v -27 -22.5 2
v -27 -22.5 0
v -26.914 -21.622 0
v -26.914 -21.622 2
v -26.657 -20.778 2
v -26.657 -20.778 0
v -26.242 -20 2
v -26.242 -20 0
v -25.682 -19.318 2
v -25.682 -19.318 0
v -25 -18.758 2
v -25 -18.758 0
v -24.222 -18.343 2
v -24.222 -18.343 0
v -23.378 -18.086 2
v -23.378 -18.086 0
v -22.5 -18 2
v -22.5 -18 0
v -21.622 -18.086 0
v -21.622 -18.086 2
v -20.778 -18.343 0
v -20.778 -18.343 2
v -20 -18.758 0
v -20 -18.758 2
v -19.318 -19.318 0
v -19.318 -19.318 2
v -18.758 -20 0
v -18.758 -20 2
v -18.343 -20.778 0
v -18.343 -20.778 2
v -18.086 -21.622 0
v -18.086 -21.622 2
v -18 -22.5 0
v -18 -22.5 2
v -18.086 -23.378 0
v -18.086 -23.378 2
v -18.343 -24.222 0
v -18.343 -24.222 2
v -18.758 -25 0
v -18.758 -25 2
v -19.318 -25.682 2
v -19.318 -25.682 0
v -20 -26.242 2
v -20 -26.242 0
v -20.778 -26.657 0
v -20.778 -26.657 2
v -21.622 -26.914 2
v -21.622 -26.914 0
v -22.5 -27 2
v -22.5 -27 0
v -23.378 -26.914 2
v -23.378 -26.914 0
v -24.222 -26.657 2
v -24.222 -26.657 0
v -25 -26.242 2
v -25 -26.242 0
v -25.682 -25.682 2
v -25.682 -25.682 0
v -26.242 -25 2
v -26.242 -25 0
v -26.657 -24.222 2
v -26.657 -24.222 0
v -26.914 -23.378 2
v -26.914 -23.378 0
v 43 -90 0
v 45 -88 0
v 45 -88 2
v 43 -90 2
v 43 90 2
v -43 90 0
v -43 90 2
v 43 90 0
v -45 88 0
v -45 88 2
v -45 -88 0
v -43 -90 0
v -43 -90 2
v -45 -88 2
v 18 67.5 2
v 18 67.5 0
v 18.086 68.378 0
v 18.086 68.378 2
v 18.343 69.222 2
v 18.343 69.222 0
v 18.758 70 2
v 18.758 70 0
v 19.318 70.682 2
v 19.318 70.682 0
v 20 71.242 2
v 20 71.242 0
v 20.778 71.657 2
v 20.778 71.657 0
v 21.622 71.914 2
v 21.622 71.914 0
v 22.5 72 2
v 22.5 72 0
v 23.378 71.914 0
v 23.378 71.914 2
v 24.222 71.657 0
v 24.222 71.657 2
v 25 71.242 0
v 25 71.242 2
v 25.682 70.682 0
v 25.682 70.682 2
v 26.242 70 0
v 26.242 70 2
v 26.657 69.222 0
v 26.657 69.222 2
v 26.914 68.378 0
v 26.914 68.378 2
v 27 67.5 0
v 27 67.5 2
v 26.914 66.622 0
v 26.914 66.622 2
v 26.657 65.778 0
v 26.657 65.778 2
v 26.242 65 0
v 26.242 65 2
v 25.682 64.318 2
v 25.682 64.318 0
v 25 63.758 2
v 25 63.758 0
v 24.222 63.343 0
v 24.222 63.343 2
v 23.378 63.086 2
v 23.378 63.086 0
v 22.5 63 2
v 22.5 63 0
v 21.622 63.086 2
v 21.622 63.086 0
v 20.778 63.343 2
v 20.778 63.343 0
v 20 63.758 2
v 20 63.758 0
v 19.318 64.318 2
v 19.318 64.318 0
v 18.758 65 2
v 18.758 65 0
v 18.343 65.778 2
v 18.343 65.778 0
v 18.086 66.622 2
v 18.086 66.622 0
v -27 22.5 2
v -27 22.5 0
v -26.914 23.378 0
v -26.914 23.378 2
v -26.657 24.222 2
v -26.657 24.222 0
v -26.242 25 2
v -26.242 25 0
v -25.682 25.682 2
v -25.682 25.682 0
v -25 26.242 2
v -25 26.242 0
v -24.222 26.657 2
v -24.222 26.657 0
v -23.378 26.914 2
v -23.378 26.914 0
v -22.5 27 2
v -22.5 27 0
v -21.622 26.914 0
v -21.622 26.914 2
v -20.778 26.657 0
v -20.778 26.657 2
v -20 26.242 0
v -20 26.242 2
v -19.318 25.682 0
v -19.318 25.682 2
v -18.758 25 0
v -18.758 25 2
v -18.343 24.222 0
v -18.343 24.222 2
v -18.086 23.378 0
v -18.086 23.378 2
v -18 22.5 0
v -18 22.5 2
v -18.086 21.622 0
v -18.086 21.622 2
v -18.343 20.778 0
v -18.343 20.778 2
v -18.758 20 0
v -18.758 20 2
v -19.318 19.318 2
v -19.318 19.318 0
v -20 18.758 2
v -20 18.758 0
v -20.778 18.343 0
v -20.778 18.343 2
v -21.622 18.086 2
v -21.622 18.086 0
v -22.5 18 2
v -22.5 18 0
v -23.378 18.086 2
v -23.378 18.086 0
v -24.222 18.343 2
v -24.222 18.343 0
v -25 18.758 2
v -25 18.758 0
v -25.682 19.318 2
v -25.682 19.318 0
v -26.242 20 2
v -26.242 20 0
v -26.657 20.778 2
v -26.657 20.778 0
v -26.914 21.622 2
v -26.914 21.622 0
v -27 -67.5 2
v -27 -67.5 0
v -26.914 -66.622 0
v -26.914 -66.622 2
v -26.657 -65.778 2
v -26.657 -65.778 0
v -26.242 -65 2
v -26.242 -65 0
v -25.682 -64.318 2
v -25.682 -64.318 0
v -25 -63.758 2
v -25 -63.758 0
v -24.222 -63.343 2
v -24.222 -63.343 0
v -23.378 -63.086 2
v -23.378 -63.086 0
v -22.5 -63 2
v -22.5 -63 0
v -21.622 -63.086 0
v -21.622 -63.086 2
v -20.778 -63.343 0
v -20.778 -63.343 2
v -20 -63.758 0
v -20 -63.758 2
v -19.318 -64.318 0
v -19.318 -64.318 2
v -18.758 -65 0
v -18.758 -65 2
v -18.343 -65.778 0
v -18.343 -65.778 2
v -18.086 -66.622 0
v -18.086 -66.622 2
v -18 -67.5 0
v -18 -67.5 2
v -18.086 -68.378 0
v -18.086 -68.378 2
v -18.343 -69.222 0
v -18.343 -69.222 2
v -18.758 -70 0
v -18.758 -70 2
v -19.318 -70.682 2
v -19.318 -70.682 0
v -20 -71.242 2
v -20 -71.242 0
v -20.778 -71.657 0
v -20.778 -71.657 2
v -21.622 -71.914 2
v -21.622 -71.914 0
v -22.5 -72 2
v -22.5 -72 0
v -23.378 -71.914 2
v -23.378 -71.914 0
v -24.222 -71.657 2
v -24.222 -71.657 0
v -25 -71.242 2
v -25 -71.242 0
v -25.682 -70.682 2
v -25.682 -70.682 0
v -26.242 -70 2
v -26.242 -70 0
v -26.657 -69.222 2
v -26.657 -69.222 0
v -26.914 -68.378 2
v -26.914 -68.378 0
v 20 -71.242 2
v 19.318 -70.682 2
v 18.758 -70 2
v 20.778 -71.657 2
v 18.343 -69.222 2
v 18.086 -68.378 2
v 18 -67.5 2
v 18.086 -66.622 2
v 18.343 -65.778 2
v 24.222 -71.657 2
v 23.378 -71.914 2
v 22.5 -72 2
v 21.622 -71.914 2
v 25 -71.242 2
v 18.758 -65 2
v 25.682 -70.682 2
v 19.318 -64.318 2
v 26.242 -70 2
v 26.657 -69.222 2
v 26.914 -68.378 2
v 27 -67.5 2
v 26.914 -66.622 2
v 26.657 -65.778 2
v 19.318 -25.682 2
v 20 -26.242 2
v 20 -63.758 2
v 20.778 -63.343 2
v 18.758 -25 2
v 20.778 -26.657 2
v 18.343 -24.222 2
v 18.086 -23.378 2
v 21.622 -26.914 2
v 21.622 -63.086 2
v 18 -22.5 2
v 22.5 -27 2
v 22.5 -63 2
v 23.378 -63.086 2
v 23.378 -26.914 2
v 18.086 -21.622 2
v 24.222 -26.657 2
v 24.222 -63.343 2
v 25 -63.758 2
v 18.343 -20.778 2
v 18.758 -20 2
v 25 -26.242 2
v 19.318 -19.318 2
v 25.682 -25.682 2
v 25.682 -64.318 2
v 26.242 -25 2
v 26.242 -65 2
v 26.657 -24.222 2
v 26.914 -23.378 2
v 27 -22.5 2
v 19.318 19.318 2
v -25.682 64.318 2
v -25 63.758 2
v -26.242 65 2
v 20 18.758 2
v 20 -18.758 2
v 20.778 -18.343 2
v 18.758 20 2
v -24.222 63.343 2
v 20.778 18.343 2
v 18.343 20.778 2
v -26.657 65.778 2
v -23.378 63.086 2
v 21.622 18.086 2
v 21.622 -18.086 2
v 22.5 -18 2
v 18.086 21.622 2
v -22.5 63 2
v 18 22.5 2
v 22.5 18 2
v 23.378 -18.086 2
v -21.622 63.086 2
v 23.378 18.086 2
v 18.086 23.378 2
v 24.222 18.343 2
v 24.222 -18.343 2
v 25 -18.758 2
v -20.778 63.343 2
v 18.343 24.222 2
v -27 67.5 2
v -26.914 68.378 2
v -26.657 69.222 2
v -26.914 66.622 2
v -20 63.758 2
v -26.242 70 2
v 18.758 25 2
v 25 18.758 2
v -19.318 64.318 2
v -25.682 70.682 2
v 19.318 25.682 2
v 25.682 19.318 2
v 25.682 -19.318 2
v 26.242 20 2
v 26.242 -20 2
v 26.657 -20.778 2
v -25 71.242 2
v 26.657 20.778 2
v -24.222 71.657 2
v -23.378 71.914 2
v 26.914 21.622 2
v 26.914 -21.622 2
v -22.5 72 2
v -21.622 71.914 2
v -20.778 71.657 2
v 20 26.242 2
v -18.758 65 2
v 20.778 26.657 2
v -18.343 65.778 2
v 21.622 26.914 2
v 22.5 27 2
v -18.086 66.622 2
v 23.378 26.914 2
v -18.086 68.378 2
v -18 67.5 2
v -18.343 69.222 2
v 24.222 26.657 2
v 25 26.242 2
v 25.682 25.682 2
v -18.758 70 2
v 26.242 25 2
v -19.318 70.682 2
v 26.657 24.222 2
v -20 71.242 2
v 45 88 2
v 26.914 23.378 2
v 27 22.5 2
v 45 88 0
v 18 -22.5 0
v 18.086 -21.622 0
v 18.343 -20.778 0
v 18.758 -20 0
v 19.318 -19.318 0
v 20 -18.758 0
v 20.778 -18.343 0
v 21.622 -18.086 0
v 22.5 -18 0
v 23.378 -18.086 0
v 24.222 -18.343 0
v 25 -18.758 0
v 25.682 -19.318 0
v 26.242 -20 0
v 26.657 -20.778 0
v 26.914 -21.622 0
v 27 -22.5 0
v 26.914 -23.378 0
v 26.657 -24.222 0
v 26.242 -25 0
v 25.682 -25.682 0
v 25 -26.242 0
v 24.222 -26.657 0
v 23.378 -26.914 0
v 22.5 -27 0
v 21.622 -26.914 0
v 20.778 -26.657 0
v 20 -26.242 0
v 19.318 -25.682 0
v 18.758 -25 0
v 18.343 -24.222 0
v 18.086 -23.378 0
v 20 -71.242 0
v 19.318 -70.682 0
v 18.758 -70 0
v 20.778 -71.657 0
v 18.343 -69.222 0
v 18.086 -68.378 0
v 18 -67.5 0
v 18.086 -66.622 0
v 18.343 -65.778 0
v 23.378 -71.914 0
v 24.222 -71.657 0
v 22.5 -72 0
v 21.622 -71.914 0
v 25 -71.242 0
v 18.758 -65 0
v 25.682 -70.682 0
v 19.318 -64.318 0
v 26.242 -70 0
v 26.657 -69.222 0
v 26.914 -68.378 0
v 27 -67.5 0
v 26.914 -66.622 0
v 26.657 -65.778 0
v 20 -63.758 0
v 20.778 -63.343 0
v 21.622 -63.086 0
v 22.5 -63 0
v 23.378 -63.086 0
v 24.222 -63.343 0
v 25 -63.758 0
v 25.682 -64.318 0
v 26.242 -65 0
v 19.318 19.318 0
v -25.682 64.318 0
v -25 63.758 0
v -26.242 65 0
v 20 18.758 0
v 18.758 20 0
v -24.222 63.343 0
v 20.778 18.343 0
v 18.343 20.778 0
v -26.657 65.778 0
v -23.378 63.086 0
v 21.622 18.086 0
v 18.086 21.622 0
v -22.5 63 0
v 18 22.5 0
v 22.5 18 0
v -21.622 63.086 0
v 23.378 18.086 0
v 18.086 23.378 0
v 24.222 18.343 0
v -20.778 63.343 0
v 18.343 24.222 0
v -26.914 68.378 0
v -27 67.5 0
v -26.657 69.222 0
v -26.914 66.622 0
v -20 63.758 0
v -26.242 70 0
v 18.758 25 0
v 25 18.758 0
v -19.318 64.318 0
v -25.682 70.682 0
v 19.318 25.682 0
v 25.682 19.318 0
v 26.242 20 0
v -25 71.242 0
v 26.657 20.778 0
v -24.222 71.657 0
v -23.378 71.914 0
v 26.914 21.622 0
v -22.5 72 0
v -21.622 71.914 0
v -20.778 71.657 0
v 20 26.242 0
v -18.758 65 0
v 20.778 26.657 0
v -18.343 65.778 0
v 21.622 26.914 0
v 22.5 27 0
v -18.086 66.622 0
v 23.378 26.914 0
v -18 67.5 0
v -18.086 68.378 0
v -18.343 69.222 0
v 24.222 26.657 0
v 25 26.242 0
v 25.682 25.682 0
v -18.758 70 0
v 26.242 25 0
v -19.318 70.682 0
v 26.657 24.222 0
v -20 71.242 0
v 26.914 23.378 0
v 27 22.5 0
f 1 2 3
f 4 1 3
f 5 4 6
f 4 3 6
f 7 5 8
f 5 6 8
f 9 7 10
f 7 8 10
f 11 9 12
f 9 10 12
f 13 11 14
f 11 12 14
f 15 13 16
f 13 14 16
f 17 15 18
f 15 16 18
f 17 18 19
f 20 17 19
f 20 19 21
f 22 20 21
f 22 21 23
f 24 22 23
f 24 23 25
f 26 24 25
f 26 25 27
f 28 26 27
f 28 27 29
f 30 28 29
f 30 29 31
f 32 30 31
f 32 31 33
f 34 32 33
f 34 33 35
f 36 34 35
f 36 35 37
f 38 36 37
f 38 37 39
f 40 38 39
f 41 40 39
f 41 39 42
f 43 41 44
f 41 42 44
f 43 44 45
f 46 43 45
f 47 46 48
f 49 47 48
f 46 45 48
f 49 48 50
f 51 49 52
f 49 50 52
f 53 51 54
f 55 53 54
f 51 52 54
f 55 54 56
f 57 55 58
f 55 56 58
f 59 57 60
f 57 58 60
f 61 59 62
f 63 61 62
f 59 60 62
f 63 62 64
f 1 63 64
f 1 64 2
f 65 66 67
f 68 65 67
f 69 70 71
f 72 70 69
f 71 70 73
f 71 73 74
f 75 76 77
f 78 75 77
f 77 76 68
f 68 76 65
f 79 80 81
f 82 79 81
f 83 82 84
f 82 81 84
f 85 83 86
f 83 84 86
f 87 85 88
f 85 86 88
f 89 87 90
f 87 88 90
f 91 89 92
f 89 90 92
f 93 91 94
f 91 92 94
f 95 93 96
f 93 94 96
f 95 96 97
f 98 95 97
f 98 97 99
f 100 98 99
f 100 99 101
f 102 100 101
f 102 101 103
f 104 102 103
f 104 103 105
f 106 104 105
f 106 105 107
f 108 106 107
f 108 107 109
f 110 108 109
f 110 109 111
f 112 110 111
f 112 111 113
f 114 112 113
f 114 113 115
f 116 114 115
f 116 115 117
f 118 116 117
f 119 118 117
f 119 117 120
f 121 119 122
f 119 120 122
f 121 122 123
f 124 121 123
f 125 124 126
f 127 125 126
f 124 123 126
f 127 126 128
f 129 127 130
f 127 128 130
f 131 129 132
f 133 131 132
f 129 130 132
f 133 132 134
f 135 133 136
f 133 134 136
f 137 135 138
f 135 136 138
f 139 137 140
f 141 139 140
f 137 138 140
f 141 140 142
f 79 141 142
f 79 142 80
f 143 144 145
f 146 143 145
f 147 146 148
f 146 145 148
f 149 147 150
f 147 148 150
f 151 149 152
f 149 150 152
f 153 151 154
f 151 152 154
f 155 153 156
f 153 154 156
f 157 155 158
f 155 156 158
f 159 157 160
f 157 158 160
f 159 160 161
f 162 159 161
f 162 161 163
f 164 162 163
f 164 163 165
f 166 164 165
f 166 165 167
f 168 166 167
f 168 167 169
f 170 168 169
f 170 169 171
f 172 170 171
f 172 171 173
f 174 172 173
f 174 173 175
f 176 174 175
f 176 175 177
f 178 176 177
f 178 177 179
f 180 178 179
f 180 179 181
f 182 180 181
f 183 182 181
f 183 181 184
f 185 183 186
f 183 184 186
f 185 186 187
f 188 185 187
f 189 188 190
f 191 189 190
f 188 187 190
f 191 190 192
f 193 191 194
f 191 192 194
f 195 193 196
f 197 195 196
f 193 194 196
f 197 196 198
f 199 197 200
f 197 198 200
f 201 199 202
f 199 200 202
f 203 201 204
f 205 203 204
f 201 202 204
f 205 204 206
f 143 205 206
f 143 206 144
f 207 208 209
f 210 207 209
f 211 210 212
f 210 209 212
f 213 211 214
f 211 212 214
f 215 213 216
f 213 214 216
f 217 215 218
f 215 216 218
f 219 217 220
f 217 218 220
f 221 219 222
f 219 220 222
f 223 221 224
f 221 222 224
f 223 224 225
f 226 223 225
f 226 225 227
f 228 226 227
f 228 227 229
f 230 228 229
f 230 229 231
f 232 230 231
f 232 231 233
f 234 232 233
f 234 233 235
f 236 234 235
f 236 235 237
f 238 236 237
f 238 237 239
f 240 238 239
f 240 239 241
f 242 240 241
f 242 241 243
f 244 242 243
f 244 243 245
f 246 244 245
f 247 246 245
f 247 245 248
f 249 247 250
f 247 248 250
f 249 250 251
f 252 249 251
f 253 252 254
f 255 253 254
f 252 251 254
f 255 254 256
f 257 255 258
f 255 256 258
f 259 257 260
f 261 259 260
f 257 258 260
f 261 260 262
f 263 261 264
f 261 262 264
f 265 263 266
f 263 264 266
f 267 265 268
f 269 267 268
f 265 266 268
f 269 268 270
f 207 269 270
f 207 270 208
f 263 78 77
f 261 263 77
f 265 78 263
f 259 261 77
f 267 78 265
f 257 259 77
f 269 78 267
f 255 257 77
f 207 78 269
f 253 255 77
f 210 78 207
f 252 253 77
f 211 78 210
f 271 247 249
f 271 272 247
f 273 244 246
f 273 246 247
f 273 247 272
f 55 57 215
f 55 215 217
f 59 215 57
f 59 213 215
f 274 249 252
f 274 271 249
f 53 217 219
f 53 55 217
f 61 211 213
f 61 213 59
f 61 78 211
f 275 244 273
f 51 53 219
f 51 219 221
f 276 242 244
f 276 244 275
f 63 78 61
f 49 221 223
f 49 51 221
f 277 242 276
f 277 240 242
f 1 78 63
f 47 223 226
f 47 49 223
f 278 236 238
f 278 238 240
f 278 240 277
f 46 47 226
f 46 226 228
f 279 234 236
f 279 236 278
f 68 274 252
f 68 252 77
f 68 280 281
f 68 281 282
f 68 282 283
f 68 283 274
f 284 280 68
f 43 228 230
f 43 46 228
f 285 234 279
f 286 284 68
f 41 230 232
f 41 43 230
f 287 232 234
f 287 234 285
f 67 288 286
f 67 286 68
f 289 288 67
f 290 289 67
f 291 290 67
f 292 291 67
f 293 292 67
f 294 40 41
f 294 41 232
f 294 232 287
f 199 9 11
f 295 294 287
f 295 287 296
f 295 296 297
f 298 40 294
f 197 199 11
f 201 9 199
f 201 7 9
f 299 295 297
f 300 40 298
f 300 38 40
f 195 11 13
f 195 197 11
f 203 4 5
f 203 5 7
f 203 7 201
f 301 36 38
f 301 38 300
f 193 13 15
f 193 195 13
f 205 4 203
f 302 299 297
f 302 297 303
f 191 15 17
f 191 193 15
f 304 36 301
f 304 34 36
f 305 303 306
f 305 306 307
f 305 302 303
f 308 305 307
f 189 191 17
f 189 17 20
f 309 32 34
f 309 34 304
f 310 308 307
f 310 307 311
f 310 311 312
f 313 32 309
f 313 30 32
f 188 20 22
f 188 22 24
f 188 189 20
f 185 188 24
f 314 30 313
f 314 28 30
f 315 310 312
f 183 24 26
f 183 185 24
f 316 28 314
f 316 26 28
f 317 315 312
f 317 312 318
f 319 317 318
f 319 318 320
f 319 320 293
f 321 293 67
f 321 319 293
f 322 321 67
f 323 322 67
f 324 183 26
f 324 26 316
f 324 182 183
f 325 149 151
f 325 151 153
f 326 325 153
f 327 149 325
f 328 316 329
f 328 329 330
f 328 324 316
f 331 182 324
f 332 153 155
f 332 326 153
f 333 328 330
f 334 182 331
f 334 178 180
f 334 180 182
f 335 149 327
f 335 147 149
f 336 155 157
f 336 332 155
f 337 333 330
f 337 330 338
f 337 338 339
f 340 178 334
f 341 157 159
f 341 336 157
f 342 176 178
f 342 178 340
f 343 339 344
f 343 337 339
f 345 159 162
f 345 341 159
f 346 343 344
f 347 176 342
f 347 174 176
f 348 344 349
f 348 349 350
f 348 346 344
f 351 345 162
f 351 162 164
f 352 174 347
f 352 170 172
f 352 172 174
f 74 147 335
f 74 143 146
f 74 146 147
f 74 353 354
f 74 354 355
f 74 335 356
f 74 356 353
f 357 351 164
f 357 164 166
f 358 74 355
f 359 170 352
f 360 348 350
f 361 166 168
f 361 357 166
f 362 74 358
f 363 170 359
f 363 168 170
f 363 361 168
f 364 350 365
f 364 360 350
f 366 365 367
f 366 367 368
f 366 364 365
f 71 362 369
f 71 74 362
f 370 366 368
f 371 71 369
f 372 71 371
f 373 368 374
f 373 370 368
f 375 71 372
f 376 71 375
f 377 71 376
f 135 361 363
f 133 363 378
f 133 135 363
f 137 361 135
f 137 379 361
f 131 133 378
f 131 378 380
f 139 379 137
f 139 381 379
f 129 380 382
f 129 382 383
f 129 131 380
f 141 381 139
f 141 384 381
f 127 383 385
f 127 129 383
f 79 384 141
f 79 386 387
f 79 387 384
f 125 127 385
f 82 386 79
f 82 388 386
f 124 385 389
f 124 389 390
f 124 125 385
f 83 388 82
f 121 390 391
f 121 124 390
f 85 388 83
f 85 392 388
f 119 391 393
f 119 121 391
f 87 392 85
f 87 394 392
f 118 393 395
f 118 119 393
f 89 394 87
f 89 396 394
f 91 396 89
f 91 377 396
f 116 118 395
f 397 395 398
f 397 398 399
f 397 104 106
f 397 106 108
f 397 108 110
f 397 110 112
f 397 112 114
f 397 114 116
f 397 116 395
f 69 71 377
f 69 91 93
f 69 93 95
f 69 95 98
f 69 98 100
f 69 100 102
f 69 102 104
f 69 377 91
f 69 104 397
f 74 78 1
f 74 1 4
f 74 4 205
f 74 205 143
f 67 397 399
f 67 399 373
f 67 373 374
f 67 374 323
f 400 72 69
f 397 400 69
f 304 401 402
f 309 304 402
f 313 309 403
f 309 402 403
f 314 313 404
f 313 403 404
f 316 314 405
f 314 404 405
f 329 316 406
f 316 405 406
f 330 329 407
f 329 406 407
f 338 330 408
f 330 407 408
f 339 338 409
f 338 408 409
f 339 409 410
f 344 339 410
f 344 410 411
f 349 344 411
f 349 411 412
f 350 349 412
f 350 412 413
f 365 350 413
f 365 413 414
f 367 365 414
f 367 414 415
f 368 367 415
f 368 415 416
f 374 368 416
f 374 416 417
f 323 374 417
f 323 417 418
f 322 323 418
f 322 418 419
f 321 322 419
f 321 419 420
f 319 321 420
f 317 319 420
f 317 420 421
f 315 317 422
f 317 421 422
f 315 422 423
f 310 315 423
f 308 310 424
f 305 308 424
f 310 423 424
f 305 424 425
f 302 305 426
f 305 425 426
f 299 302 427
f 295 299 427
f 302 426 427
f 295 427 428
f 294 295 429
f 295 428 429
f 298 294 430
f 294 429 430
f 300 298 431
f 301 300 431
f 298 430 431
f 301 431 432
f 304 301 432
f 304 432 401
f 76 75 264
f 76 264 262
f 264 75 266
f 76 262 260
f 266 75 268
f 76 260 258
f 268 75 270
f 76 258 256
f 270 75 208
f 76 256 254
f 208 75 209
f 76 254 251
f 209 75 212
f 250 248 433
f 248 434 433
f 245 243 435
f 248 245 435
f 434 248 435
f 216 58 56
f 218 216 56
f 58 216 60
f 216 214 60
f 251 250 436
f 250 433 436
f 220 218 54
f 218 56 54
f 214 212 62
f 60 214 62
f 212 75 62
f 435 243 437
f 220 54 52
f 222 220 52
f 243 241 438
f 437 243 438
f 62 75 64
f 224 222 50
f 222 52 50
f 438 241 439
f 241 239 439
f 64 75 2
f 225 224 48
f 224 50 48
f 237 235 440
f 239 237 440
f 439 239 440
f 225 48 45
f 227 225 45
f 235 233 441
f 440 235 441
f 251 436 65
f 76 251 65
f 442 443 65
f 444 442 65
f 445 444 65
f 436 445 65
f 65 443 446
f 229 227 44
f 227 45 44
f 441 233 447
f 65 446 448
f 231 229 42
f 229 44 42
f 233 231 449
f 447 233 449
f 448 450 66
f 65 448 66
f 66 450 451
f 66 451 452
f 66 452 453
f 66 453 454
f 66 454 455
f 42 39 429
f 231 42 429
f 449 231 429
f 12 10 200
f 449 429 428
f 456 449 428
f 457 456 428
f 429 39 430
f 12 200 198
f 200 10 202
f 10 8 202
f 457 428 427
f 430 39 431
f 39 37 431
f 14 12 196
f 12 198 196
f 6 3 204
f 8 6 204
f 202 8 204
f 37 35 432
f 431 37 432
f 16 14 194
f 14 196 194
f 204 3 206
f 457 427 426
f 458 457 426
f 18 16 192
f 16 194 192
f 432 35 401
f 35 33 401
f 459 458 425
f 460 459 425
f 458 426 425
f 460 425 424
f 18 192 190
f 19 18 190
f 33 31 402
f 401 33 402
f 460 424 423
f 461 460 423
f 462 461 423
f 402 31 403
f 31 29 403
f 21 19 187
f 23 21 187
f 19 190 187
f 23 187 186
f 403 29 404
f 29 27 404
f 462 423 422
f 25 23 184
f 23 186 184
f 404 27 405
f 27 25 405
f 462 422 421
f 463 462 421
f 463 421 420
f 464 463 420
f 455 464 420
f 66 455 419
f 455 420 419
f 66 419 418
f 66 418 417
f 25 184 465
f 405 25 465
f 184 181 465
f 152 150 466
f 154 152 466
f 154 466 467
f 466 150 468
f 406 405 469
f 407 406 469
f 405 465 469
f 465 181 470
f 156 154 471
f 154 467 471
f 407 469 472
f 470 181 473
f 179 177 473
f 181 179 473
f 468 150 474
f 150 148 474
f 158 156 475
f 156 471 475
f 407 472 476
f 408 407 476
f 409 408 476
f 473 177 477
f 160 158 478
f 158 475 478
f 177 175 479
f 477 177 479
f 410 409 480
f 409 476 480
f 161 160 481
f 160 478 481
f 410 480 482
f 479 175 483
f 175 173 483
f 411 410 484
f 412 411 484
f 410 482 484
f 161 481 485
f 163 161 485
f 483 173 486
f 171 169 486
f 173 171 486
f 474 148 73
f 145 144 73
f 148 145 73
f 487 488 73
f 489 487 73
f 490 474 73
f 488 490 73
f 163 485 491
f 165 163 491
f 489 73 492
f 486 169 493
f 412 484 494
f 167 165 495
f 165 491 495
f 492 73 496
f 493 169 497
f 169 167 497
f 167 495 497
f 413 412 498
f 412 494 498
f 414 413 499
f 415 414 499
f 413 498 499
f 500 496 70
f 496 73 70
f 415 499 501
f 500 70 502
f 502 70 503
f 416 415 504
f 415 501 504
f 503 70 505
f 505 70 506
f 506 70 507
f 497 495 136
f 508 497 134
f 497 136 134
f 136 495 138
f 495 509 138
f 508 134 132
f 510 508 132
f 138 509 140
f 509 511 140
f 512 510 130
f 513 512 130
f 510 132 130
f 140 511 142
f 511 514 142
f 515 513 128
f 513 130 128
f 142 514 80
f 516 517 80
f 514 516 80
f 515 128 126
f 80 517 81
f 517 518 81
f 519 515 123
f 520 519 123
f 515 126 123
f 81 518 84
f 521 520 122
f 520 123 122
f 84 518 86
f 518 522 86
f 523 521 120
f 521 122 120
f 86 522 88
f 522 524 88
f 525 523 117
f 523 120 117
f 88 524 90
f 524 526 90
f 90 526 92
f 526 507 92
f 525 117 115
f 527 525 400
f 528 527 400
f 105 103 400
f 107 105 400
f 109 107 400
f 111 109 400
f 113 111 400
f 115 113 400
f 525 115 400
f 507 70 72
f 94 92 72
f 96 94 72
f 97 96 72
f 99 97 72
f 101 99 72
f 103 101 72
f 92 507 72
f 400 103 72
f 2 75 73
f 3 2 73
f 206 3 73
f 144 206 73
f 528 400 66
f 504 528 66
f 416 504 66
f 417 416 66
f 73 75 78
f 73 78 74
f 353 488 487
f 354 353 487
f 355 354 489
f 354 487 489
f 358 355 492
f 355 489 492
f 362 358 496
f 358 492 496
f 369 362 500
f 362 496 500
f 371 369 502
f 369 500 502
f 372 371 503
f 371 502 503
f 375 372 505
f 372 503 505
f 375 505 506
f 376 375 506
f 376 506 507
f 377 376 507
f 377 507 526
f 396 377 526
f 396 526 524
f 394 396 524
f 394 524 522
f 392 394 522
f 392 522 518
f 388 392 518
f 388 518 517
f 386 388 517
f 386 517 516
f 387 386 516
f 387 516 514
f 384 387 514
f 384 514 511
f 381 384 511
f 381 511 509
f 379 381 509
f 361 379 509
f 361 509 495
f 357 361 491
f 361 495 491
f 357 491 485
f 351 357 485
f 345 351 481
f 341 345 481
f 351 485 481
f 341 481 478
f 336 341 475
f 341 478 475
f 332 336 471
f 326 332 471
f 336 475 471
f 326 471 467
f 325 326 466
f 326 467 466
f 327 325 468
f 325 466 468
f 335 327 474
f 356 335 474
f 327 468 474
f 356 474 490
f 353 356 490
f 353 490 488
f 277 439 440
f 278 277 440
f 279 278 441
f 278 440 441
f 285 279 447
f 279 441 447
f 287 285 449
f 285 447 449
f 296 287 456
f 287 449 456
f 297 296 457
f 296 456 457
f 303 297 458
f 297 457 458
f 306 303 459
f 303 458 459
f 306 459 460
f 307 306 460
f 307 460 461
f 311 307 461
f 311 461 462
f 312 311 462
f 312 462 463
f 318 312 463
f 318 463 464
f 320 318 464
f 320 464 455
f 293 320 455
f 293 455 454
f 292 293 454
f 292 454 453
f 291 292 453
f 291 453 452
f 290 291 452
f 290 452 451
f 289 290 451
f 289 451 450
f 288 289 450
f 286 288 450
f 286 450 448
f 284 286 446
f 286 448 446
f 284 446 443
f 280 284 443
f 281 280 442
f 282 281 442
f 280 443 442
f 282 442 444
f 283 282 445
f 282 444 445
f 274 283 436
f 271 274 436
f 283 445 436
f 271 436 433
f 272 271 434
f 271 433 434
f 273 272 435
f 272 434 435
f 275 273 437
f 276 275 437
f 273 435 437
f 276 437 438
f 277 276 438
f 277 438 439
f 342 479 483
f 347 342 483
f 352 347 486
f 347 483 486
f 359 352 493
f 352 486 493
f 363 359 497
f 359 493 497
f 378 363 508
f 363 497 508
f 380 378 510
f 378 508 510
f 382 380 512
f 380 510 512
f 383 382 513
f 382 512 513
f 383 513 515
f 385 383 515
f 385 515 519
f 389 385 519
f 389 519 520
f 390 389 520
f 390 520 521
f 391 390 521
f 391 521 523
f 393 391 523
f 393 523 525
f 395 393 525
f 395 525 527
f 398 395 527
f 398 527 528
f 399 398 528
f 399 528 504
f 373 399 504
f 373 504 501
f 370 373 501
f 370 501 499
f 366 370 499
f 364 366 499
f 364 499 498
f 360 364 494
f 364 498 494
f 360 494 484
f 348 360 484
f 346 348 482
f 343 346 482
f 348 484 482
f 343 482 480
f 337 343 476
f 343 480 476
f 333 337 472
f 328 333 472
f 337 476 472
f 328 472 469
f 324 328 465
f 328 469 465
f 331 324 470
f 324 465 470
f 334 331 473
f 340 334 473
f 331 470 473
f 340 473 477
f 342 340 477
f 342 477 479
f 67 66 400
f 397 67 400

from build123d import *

# Parameters (mm, degrees)
SKETCH_1_W        = 90
SKETCH_1_H        = 180
EXTRUDE_1_DEPTH   = 2
CHAMFER_1_SIZE    = 2
HOLE_WIZARD_M81_D = 9


with BuildPart() as part:
    # Эскиз1 → Бобышка-Вытянуть1 (new body)
    with BuildSketch(Plane.XY):
        Rectangle(SKETCH_1_W, SKETCH_1_H)
    extrude(amount=EXTRUDE_1_DEPTH)

    # Фаска1
    chamfer_1_edges = [part.edges().sort_by_distance(p)[0] for p in [
        (45, -90, 1),
        (-45, -90, 1),
        (-45, 90, 1),
        (45, 90, 1),
    ]]
    chamfer(chamfer_1_edges, length=CHAMFER_1_SIZE)

    # Отверстие с зазором M81 (through all)
    with Locations(Plane.XY.offset(2)):
        with Locations((-22.5, 22.5), (22.5, 22.5), (-22.5, -22.5), (22.5, -22.5), (-22.5, 67.5), (22.5, 67.5), (22.5, -67.5), (-22.5, -67.5)):
            Hole(HOLE_WIZARD_M81_D / 2)


solid = part.part
